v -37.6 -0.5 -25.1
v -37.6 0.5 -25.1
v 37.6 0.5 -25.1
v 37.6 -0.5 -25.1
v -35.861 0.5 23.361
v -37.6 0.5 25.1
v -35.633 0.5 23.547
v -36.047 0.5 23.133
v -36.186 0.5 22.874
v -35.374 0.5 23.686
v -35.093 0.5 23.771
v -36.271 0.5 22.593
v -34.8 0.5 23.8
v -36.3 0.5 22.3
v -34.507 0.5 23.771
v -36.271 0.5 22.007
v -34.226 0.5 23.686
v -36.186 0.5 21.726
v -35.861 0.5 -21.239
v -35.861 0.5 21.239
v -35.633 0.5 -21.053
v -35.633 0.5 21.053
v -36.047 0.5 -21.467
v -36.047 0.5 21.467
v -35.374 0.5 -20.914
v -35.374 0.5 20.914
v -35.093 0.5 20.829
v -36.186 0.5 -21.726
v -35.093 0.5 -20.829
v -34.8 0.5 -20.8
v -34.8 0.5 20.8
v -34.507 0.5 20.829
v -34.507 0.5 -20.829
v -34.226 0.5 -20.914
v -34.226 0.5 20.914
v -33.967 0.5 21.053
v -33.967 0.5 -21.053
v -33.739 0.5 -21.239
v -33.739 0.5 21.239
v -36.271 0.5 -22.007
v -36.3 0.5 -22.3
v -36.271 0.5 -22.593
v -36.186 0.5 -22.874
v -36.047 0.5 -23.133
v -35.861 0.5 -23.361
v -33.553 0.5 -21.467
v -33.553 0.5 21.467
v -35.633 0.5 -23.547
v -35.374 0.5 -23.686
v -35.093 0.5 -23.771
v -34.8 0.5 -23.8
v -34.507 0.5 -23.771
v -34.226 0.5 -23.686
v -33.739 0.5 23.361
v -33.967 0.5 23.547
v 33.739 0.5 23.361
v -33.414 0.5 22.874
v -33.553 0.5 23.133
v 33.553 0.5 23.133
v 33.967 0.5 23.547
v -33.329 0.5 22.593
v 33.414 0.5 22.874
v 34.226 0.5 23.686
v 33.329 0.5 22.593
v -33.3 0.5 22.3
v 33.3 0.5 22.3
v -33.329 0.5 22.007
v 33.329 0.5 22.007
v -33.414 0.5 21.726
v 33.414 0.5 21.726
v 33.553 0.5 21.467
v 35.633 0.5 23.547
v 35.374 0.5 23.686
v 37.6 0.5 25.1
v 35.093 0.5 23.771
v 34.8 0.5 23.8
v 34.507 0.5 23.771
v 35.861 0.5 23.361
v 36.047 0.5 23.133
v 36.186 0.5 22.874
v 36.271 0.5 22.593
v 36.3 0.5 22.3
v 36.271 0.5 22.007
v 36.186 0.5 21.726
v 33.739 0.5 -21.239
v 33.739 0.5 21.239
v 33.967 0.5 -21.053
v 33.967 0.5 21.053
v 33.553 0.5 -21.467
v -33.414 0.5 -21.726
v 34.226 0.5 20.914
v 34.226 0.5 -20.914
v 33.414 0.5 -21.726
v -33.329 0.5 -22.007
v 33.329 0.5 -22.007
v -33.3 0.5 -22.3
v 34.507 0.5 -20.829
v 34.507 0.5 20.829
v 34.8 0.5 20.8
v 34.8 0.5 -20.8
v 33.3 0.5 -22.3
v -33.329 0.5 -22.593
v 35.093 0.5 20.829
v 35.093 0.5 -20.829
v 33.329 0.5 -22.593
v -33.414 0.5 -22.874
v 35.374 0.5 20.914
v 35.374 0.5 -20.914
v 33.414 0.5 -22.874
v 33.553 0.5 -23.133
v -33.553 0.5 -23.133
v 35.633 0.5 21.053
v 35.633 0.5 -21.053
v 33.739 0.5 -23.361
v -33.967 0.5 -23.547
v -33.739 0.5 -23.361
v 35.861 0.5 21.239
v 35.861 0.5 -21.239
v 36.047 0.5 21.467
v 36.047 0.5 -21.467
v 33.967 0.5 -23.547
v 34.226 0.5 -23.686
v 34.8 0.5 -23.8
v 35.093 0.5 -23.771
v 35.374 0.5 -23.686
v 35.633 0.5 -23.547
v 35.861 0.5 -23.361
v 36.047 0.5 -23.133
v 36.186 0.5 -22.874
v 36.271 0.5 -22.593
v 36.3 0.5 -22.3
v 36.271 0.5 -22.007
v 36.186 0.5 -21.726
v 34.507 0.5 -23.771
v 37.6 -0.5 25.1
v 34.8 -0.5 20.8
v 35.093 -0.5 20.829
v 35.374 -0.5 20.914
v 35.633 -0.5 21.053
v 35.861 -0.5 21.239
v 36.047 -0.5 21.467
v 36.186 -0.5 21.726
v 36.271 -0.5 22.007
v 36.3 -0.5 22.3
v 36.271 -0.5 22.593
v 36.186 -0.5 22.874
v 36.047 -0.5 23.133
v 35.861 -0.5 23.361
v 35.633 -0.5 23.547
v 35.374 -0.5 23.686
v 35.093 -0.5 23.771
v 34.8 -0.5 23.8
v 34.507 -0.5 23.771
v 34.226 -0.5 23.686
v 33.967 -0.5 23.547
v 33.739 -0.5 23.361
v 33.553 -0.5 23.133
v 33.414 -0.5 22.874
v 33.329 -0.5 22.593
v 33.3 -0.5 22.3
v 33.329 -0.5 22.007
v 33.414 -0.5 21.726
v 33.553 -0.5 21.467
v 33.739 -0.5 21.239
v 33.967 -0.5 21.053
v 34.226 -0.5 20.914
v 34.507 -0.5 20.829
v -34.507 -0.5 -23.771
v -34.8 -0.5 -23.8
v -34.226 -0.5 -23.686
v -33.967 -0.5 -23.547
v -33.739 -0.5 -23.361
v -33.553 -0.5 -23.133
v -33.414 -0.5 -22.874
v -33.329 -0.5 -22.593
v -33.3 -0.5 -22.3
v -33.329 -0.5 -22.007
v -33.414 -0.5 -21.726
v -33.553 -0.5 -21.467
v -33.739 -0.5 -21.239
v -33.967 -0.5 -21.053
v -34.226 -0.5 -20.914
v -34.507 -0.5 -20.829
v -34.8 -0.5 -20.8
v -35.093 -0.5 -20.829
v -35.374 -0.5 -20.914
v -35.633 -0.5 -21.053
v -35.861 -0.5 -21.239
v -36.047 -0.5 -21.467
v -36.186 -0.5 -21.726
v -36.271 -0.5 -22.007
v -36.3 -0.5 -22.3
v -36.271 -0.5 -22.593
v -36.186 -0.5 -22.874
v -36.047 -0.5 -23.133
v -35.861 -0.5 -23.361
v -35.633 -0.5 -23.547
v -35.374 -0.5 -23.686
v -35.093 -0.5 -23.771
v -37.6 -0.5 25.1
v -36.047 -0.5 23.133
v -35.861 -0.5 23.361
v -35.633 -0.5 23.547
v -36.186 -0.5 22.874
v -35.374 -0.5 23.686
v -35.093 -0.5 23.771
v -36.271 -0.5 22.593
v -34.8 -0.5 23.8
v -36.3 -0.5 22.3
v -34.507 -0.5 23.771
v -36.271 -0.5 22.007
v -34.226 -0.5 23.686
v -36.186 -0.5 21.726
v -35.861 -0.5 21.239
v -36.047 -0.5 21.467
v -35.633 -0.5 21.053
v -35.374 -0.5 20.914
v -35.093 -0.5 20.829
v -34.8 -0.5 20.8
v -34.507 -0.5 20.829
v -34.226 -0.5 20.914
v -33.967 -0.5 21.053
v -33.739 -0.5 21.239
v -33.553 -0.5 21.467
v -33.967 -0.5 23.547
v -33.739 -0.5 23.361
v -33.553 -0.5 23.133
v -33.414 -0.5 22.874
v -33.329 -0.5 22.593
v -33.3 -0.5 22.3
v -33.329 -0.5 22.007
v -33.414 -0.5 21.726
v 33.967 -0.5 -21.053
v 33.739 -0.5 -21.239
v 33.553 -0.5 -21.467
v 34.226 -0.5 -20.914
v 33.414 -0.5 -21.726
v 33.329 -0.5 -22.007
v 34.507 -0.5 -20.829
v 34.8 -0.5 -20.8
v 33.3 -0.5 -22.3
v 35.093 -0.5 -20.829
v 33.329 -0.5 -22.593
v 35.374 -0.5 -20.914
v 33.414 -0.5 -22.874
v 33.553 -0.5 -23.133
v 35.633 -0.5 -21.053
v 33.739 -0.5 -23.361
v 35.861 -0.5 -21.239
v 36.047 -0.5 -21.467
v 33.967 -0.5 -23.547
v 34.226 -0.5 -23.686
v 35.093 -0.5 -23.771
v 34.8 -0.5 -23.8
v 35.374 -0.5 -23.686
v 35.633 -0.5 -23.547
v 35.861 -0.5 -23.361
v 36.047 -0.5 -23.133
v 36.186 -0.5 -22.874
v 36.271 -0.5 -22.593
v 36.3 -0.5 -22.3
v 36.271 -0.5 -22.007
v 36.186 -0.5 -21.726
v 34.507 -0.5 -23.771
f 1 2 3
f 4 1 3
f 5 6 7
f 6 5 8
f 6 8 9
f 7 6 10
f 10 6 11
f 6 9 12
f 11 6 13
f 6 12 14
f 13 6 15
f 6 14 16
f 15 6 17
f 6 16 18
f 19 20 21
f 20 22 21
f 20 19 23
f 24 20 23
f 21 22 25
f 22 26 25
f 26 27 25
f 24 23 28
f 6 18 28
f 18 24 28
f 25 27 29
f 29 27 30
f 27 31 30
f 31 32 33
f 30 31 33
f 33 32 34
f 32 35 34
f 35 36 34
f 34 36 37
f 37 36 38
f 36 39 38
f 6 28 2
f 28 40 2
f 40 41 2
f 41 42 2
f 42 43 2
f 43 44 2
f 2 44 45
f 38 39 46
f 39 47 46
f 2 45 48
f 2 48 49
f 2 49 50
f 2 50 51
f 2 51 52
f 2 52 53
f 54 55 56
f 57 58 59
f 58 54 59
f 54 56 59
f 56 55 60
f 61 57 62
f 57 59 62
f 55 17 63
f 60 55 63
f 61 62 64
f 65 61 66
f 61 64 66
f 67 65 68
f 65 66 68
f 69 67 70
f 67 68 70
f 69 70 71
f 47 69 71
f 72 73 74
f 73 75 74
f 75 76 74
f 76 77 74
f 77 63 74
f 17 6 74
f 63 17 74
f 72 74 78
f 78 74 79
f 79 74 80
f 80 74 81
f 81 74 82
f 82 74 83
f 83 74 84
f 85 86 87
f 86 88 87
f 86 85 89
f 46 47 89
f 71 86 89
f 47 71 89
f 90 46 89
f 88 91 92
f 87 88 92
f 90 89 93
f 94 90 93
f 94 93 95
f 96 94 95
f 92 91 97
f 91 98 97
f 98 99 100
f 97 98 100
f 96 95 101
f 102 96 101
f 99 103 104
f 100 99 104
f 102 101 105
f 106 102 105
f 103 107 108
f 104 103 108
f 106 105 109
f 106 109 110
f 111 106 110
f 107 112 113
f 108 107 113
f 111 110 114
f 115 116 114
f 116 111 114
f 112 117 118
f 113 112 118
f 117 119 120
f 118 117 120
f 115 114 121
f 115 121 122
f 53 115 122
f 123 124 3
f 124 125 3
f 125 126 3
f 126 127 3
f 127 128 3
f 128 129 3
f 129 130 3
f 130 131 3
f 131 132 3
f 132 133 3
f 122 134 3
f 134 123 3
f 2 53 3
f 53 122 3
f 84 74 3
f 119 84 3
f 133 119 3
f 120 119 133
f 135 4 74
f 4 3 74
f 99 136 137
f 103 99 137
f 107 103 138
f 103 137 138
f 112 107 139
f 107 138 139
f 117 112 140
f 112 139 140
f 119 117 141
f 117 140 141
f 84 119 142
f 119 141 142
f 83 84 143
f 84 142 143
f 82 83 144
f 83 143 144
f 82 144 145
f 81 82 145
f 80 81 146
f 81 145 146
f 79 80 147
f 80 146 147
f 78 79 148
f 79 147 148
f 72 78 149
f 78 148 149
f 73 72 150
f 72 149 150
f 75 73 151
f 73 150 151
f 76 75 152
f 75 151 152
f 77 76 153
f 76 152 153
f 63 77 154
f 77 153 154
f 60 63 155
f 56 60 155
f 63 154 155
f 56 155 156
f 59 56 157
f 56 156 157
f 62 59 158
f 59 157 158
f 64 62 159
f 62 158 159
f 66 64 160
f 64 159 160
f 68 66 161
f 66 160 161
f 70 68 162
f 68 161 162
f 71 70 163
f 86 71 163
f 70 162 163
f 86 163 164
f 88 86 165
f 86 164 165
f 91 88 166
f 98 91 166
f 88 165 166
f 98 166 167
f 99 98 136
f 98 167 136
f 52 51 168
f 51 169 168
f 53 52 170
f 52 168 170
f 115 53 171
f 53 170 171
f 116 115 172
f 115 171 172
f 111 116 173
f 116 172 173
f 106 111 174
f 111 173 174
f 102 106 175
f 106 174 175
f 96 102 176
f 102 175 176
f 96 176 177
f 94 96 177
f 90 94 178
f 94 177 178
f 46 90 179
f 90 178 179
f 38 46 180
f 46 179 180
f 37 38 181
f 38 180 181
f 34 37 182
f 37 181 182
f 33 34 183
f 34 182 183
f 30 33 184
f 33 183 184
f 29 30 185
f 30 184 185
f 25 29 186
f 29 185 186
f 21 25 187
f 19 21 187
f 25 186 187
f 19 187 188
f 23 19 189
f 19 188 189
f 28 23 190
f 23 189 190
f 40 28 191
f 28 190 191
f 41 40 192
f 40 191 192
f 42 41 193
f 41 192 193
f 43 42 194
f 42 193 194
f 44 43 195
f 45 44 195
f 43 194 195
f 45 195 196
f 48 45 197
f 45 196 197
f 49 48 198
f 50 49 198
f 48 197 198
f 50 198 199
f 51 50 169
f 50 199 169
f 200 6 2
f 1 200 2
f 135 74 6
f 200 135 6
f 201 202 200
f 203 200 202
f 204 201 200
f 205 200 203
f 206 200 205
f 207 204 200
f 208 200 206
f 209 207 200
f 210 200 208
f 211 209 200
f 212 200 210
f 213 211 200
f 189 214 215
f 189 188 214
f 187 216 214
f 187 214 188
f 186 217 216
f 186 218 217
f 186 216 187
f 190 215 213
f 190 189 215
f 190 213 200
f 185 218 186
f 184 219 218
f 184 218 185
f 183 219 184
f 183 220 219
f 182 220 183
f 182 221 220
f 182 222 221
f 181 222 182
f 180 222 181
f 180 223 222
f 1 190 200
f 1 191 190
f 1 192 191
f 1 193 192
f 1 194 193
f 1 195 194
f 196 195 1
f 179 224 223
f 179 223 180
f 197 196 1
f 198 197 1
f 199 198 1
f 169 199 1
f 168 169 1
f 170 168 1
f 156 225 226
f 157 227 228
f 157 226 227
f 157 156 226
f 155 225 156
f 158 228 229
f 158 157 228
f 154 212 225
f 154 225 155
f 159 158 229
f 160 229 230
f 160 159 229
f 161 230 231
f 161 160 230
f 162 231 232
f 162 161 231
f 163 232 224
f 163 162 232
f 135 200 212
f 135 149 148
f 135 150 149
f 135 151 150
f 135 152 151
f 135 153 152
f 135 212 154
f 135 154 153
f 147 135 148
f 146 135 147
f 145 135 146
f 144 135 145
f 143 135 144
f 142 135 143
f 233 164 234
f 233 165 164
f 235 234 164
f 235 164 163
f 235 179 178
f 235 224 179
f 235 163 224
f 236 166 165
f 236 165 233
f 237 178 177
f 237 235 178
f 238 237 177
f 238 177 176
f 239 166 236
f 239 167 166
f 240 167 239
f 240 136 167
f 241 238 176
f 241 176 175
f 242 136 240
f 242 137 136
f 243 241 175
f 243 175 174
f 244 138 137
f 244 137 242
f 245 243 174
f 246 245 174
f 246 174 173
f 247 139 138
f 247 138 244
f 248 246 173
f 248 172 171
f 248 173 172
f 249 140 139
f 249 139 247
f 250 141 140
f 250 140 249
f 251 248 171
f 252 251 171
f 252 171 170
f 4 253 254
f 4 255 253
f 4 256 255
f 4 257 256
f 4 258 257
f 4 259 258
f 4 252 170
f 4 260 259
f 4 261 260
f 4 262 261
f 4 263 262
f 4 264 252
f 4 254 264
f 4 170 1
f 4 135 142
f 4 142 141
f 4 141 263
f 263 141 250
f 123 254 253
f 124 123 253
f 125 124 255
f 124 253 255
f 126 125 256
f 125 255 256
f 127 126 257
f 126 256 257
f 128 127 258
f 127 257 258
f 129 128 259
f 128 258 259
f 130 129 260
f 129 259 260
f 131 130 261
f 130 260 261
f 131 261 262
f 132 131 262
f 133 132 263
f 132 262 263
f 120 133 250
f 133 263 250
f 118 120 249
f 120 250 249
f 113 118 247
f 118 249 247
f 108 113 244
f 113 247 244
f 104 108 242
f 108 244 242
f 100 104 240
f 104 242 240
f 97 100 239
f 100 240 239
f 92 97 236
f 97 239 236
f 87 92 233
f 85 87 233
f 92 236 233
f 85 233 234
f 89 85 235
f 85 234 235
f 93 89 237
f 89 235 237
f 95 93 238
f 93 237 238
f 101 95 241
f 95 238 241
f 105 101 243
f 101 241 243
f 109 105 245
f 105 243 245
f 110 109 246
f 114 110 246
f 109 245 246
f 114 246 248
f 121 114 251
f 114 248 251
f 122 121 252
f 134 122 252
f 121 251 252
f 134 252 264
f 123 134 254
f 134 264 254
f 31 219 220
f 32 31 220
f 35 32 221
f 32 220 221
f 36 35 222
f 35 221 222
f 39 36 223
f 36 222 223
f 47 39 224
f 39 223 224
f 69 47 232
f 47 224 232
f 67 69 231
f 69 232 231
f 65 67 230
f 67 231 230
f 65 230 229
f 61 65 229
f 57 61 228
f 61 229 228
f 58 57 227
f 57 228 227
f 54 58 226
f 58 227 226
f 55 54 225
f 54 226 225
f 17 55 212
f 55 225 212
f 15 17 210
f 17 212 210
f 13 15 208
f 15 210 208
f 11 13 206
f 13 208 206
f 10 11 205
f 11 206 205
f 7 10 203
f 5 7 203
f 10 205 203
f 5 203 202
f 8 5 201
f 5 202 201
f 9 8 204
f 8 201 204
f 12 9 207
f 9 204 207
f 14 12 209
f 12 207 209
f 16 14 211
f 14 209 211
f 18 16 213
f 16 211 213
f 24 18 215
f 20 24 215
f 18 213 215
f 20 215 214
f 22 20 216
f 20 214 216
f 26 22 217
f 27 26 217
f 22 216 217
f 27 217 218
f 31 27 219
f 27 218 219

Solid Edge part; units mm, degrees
sketch "Sketch1" plane through (0, 0, 0) normal (0, -1, 0) x (1, 0, 0)
  line L0 (-37.6, -25.1) -> (37.6, -25.1)
  line L1 (37.6, -25.1) -> (37.6, 25.1)
  line L2 (37.6, 25.1) -> (-37.6, 25.1)
  line L3 (-37.6, 25.1) -> (-37.6, -25.1)
extrude "Protrusion1" add sketch "Sketch1" along normal mid plane 1
sketch "Sketch2" plane through (0, -0.5, 0) normal (0, -1, 0) x (0, 0, -1)
  circle A0 centre (-22.3, 34.8) radius 1.5
  circle A1 centre (22.3, 34.8) radius 1.5
  circle A2 centre (-22.3, -34.8) radius 1.5
  circle A3 centre (22.3, -34.8) radius 1.5
  dimension "D1" = 2.8
  dimension "D2" = 3
  dimension "D3" = 2.8
extrude "Cutout1" cut sketch "Sketch2" against normal up to surface (1 mm away)
